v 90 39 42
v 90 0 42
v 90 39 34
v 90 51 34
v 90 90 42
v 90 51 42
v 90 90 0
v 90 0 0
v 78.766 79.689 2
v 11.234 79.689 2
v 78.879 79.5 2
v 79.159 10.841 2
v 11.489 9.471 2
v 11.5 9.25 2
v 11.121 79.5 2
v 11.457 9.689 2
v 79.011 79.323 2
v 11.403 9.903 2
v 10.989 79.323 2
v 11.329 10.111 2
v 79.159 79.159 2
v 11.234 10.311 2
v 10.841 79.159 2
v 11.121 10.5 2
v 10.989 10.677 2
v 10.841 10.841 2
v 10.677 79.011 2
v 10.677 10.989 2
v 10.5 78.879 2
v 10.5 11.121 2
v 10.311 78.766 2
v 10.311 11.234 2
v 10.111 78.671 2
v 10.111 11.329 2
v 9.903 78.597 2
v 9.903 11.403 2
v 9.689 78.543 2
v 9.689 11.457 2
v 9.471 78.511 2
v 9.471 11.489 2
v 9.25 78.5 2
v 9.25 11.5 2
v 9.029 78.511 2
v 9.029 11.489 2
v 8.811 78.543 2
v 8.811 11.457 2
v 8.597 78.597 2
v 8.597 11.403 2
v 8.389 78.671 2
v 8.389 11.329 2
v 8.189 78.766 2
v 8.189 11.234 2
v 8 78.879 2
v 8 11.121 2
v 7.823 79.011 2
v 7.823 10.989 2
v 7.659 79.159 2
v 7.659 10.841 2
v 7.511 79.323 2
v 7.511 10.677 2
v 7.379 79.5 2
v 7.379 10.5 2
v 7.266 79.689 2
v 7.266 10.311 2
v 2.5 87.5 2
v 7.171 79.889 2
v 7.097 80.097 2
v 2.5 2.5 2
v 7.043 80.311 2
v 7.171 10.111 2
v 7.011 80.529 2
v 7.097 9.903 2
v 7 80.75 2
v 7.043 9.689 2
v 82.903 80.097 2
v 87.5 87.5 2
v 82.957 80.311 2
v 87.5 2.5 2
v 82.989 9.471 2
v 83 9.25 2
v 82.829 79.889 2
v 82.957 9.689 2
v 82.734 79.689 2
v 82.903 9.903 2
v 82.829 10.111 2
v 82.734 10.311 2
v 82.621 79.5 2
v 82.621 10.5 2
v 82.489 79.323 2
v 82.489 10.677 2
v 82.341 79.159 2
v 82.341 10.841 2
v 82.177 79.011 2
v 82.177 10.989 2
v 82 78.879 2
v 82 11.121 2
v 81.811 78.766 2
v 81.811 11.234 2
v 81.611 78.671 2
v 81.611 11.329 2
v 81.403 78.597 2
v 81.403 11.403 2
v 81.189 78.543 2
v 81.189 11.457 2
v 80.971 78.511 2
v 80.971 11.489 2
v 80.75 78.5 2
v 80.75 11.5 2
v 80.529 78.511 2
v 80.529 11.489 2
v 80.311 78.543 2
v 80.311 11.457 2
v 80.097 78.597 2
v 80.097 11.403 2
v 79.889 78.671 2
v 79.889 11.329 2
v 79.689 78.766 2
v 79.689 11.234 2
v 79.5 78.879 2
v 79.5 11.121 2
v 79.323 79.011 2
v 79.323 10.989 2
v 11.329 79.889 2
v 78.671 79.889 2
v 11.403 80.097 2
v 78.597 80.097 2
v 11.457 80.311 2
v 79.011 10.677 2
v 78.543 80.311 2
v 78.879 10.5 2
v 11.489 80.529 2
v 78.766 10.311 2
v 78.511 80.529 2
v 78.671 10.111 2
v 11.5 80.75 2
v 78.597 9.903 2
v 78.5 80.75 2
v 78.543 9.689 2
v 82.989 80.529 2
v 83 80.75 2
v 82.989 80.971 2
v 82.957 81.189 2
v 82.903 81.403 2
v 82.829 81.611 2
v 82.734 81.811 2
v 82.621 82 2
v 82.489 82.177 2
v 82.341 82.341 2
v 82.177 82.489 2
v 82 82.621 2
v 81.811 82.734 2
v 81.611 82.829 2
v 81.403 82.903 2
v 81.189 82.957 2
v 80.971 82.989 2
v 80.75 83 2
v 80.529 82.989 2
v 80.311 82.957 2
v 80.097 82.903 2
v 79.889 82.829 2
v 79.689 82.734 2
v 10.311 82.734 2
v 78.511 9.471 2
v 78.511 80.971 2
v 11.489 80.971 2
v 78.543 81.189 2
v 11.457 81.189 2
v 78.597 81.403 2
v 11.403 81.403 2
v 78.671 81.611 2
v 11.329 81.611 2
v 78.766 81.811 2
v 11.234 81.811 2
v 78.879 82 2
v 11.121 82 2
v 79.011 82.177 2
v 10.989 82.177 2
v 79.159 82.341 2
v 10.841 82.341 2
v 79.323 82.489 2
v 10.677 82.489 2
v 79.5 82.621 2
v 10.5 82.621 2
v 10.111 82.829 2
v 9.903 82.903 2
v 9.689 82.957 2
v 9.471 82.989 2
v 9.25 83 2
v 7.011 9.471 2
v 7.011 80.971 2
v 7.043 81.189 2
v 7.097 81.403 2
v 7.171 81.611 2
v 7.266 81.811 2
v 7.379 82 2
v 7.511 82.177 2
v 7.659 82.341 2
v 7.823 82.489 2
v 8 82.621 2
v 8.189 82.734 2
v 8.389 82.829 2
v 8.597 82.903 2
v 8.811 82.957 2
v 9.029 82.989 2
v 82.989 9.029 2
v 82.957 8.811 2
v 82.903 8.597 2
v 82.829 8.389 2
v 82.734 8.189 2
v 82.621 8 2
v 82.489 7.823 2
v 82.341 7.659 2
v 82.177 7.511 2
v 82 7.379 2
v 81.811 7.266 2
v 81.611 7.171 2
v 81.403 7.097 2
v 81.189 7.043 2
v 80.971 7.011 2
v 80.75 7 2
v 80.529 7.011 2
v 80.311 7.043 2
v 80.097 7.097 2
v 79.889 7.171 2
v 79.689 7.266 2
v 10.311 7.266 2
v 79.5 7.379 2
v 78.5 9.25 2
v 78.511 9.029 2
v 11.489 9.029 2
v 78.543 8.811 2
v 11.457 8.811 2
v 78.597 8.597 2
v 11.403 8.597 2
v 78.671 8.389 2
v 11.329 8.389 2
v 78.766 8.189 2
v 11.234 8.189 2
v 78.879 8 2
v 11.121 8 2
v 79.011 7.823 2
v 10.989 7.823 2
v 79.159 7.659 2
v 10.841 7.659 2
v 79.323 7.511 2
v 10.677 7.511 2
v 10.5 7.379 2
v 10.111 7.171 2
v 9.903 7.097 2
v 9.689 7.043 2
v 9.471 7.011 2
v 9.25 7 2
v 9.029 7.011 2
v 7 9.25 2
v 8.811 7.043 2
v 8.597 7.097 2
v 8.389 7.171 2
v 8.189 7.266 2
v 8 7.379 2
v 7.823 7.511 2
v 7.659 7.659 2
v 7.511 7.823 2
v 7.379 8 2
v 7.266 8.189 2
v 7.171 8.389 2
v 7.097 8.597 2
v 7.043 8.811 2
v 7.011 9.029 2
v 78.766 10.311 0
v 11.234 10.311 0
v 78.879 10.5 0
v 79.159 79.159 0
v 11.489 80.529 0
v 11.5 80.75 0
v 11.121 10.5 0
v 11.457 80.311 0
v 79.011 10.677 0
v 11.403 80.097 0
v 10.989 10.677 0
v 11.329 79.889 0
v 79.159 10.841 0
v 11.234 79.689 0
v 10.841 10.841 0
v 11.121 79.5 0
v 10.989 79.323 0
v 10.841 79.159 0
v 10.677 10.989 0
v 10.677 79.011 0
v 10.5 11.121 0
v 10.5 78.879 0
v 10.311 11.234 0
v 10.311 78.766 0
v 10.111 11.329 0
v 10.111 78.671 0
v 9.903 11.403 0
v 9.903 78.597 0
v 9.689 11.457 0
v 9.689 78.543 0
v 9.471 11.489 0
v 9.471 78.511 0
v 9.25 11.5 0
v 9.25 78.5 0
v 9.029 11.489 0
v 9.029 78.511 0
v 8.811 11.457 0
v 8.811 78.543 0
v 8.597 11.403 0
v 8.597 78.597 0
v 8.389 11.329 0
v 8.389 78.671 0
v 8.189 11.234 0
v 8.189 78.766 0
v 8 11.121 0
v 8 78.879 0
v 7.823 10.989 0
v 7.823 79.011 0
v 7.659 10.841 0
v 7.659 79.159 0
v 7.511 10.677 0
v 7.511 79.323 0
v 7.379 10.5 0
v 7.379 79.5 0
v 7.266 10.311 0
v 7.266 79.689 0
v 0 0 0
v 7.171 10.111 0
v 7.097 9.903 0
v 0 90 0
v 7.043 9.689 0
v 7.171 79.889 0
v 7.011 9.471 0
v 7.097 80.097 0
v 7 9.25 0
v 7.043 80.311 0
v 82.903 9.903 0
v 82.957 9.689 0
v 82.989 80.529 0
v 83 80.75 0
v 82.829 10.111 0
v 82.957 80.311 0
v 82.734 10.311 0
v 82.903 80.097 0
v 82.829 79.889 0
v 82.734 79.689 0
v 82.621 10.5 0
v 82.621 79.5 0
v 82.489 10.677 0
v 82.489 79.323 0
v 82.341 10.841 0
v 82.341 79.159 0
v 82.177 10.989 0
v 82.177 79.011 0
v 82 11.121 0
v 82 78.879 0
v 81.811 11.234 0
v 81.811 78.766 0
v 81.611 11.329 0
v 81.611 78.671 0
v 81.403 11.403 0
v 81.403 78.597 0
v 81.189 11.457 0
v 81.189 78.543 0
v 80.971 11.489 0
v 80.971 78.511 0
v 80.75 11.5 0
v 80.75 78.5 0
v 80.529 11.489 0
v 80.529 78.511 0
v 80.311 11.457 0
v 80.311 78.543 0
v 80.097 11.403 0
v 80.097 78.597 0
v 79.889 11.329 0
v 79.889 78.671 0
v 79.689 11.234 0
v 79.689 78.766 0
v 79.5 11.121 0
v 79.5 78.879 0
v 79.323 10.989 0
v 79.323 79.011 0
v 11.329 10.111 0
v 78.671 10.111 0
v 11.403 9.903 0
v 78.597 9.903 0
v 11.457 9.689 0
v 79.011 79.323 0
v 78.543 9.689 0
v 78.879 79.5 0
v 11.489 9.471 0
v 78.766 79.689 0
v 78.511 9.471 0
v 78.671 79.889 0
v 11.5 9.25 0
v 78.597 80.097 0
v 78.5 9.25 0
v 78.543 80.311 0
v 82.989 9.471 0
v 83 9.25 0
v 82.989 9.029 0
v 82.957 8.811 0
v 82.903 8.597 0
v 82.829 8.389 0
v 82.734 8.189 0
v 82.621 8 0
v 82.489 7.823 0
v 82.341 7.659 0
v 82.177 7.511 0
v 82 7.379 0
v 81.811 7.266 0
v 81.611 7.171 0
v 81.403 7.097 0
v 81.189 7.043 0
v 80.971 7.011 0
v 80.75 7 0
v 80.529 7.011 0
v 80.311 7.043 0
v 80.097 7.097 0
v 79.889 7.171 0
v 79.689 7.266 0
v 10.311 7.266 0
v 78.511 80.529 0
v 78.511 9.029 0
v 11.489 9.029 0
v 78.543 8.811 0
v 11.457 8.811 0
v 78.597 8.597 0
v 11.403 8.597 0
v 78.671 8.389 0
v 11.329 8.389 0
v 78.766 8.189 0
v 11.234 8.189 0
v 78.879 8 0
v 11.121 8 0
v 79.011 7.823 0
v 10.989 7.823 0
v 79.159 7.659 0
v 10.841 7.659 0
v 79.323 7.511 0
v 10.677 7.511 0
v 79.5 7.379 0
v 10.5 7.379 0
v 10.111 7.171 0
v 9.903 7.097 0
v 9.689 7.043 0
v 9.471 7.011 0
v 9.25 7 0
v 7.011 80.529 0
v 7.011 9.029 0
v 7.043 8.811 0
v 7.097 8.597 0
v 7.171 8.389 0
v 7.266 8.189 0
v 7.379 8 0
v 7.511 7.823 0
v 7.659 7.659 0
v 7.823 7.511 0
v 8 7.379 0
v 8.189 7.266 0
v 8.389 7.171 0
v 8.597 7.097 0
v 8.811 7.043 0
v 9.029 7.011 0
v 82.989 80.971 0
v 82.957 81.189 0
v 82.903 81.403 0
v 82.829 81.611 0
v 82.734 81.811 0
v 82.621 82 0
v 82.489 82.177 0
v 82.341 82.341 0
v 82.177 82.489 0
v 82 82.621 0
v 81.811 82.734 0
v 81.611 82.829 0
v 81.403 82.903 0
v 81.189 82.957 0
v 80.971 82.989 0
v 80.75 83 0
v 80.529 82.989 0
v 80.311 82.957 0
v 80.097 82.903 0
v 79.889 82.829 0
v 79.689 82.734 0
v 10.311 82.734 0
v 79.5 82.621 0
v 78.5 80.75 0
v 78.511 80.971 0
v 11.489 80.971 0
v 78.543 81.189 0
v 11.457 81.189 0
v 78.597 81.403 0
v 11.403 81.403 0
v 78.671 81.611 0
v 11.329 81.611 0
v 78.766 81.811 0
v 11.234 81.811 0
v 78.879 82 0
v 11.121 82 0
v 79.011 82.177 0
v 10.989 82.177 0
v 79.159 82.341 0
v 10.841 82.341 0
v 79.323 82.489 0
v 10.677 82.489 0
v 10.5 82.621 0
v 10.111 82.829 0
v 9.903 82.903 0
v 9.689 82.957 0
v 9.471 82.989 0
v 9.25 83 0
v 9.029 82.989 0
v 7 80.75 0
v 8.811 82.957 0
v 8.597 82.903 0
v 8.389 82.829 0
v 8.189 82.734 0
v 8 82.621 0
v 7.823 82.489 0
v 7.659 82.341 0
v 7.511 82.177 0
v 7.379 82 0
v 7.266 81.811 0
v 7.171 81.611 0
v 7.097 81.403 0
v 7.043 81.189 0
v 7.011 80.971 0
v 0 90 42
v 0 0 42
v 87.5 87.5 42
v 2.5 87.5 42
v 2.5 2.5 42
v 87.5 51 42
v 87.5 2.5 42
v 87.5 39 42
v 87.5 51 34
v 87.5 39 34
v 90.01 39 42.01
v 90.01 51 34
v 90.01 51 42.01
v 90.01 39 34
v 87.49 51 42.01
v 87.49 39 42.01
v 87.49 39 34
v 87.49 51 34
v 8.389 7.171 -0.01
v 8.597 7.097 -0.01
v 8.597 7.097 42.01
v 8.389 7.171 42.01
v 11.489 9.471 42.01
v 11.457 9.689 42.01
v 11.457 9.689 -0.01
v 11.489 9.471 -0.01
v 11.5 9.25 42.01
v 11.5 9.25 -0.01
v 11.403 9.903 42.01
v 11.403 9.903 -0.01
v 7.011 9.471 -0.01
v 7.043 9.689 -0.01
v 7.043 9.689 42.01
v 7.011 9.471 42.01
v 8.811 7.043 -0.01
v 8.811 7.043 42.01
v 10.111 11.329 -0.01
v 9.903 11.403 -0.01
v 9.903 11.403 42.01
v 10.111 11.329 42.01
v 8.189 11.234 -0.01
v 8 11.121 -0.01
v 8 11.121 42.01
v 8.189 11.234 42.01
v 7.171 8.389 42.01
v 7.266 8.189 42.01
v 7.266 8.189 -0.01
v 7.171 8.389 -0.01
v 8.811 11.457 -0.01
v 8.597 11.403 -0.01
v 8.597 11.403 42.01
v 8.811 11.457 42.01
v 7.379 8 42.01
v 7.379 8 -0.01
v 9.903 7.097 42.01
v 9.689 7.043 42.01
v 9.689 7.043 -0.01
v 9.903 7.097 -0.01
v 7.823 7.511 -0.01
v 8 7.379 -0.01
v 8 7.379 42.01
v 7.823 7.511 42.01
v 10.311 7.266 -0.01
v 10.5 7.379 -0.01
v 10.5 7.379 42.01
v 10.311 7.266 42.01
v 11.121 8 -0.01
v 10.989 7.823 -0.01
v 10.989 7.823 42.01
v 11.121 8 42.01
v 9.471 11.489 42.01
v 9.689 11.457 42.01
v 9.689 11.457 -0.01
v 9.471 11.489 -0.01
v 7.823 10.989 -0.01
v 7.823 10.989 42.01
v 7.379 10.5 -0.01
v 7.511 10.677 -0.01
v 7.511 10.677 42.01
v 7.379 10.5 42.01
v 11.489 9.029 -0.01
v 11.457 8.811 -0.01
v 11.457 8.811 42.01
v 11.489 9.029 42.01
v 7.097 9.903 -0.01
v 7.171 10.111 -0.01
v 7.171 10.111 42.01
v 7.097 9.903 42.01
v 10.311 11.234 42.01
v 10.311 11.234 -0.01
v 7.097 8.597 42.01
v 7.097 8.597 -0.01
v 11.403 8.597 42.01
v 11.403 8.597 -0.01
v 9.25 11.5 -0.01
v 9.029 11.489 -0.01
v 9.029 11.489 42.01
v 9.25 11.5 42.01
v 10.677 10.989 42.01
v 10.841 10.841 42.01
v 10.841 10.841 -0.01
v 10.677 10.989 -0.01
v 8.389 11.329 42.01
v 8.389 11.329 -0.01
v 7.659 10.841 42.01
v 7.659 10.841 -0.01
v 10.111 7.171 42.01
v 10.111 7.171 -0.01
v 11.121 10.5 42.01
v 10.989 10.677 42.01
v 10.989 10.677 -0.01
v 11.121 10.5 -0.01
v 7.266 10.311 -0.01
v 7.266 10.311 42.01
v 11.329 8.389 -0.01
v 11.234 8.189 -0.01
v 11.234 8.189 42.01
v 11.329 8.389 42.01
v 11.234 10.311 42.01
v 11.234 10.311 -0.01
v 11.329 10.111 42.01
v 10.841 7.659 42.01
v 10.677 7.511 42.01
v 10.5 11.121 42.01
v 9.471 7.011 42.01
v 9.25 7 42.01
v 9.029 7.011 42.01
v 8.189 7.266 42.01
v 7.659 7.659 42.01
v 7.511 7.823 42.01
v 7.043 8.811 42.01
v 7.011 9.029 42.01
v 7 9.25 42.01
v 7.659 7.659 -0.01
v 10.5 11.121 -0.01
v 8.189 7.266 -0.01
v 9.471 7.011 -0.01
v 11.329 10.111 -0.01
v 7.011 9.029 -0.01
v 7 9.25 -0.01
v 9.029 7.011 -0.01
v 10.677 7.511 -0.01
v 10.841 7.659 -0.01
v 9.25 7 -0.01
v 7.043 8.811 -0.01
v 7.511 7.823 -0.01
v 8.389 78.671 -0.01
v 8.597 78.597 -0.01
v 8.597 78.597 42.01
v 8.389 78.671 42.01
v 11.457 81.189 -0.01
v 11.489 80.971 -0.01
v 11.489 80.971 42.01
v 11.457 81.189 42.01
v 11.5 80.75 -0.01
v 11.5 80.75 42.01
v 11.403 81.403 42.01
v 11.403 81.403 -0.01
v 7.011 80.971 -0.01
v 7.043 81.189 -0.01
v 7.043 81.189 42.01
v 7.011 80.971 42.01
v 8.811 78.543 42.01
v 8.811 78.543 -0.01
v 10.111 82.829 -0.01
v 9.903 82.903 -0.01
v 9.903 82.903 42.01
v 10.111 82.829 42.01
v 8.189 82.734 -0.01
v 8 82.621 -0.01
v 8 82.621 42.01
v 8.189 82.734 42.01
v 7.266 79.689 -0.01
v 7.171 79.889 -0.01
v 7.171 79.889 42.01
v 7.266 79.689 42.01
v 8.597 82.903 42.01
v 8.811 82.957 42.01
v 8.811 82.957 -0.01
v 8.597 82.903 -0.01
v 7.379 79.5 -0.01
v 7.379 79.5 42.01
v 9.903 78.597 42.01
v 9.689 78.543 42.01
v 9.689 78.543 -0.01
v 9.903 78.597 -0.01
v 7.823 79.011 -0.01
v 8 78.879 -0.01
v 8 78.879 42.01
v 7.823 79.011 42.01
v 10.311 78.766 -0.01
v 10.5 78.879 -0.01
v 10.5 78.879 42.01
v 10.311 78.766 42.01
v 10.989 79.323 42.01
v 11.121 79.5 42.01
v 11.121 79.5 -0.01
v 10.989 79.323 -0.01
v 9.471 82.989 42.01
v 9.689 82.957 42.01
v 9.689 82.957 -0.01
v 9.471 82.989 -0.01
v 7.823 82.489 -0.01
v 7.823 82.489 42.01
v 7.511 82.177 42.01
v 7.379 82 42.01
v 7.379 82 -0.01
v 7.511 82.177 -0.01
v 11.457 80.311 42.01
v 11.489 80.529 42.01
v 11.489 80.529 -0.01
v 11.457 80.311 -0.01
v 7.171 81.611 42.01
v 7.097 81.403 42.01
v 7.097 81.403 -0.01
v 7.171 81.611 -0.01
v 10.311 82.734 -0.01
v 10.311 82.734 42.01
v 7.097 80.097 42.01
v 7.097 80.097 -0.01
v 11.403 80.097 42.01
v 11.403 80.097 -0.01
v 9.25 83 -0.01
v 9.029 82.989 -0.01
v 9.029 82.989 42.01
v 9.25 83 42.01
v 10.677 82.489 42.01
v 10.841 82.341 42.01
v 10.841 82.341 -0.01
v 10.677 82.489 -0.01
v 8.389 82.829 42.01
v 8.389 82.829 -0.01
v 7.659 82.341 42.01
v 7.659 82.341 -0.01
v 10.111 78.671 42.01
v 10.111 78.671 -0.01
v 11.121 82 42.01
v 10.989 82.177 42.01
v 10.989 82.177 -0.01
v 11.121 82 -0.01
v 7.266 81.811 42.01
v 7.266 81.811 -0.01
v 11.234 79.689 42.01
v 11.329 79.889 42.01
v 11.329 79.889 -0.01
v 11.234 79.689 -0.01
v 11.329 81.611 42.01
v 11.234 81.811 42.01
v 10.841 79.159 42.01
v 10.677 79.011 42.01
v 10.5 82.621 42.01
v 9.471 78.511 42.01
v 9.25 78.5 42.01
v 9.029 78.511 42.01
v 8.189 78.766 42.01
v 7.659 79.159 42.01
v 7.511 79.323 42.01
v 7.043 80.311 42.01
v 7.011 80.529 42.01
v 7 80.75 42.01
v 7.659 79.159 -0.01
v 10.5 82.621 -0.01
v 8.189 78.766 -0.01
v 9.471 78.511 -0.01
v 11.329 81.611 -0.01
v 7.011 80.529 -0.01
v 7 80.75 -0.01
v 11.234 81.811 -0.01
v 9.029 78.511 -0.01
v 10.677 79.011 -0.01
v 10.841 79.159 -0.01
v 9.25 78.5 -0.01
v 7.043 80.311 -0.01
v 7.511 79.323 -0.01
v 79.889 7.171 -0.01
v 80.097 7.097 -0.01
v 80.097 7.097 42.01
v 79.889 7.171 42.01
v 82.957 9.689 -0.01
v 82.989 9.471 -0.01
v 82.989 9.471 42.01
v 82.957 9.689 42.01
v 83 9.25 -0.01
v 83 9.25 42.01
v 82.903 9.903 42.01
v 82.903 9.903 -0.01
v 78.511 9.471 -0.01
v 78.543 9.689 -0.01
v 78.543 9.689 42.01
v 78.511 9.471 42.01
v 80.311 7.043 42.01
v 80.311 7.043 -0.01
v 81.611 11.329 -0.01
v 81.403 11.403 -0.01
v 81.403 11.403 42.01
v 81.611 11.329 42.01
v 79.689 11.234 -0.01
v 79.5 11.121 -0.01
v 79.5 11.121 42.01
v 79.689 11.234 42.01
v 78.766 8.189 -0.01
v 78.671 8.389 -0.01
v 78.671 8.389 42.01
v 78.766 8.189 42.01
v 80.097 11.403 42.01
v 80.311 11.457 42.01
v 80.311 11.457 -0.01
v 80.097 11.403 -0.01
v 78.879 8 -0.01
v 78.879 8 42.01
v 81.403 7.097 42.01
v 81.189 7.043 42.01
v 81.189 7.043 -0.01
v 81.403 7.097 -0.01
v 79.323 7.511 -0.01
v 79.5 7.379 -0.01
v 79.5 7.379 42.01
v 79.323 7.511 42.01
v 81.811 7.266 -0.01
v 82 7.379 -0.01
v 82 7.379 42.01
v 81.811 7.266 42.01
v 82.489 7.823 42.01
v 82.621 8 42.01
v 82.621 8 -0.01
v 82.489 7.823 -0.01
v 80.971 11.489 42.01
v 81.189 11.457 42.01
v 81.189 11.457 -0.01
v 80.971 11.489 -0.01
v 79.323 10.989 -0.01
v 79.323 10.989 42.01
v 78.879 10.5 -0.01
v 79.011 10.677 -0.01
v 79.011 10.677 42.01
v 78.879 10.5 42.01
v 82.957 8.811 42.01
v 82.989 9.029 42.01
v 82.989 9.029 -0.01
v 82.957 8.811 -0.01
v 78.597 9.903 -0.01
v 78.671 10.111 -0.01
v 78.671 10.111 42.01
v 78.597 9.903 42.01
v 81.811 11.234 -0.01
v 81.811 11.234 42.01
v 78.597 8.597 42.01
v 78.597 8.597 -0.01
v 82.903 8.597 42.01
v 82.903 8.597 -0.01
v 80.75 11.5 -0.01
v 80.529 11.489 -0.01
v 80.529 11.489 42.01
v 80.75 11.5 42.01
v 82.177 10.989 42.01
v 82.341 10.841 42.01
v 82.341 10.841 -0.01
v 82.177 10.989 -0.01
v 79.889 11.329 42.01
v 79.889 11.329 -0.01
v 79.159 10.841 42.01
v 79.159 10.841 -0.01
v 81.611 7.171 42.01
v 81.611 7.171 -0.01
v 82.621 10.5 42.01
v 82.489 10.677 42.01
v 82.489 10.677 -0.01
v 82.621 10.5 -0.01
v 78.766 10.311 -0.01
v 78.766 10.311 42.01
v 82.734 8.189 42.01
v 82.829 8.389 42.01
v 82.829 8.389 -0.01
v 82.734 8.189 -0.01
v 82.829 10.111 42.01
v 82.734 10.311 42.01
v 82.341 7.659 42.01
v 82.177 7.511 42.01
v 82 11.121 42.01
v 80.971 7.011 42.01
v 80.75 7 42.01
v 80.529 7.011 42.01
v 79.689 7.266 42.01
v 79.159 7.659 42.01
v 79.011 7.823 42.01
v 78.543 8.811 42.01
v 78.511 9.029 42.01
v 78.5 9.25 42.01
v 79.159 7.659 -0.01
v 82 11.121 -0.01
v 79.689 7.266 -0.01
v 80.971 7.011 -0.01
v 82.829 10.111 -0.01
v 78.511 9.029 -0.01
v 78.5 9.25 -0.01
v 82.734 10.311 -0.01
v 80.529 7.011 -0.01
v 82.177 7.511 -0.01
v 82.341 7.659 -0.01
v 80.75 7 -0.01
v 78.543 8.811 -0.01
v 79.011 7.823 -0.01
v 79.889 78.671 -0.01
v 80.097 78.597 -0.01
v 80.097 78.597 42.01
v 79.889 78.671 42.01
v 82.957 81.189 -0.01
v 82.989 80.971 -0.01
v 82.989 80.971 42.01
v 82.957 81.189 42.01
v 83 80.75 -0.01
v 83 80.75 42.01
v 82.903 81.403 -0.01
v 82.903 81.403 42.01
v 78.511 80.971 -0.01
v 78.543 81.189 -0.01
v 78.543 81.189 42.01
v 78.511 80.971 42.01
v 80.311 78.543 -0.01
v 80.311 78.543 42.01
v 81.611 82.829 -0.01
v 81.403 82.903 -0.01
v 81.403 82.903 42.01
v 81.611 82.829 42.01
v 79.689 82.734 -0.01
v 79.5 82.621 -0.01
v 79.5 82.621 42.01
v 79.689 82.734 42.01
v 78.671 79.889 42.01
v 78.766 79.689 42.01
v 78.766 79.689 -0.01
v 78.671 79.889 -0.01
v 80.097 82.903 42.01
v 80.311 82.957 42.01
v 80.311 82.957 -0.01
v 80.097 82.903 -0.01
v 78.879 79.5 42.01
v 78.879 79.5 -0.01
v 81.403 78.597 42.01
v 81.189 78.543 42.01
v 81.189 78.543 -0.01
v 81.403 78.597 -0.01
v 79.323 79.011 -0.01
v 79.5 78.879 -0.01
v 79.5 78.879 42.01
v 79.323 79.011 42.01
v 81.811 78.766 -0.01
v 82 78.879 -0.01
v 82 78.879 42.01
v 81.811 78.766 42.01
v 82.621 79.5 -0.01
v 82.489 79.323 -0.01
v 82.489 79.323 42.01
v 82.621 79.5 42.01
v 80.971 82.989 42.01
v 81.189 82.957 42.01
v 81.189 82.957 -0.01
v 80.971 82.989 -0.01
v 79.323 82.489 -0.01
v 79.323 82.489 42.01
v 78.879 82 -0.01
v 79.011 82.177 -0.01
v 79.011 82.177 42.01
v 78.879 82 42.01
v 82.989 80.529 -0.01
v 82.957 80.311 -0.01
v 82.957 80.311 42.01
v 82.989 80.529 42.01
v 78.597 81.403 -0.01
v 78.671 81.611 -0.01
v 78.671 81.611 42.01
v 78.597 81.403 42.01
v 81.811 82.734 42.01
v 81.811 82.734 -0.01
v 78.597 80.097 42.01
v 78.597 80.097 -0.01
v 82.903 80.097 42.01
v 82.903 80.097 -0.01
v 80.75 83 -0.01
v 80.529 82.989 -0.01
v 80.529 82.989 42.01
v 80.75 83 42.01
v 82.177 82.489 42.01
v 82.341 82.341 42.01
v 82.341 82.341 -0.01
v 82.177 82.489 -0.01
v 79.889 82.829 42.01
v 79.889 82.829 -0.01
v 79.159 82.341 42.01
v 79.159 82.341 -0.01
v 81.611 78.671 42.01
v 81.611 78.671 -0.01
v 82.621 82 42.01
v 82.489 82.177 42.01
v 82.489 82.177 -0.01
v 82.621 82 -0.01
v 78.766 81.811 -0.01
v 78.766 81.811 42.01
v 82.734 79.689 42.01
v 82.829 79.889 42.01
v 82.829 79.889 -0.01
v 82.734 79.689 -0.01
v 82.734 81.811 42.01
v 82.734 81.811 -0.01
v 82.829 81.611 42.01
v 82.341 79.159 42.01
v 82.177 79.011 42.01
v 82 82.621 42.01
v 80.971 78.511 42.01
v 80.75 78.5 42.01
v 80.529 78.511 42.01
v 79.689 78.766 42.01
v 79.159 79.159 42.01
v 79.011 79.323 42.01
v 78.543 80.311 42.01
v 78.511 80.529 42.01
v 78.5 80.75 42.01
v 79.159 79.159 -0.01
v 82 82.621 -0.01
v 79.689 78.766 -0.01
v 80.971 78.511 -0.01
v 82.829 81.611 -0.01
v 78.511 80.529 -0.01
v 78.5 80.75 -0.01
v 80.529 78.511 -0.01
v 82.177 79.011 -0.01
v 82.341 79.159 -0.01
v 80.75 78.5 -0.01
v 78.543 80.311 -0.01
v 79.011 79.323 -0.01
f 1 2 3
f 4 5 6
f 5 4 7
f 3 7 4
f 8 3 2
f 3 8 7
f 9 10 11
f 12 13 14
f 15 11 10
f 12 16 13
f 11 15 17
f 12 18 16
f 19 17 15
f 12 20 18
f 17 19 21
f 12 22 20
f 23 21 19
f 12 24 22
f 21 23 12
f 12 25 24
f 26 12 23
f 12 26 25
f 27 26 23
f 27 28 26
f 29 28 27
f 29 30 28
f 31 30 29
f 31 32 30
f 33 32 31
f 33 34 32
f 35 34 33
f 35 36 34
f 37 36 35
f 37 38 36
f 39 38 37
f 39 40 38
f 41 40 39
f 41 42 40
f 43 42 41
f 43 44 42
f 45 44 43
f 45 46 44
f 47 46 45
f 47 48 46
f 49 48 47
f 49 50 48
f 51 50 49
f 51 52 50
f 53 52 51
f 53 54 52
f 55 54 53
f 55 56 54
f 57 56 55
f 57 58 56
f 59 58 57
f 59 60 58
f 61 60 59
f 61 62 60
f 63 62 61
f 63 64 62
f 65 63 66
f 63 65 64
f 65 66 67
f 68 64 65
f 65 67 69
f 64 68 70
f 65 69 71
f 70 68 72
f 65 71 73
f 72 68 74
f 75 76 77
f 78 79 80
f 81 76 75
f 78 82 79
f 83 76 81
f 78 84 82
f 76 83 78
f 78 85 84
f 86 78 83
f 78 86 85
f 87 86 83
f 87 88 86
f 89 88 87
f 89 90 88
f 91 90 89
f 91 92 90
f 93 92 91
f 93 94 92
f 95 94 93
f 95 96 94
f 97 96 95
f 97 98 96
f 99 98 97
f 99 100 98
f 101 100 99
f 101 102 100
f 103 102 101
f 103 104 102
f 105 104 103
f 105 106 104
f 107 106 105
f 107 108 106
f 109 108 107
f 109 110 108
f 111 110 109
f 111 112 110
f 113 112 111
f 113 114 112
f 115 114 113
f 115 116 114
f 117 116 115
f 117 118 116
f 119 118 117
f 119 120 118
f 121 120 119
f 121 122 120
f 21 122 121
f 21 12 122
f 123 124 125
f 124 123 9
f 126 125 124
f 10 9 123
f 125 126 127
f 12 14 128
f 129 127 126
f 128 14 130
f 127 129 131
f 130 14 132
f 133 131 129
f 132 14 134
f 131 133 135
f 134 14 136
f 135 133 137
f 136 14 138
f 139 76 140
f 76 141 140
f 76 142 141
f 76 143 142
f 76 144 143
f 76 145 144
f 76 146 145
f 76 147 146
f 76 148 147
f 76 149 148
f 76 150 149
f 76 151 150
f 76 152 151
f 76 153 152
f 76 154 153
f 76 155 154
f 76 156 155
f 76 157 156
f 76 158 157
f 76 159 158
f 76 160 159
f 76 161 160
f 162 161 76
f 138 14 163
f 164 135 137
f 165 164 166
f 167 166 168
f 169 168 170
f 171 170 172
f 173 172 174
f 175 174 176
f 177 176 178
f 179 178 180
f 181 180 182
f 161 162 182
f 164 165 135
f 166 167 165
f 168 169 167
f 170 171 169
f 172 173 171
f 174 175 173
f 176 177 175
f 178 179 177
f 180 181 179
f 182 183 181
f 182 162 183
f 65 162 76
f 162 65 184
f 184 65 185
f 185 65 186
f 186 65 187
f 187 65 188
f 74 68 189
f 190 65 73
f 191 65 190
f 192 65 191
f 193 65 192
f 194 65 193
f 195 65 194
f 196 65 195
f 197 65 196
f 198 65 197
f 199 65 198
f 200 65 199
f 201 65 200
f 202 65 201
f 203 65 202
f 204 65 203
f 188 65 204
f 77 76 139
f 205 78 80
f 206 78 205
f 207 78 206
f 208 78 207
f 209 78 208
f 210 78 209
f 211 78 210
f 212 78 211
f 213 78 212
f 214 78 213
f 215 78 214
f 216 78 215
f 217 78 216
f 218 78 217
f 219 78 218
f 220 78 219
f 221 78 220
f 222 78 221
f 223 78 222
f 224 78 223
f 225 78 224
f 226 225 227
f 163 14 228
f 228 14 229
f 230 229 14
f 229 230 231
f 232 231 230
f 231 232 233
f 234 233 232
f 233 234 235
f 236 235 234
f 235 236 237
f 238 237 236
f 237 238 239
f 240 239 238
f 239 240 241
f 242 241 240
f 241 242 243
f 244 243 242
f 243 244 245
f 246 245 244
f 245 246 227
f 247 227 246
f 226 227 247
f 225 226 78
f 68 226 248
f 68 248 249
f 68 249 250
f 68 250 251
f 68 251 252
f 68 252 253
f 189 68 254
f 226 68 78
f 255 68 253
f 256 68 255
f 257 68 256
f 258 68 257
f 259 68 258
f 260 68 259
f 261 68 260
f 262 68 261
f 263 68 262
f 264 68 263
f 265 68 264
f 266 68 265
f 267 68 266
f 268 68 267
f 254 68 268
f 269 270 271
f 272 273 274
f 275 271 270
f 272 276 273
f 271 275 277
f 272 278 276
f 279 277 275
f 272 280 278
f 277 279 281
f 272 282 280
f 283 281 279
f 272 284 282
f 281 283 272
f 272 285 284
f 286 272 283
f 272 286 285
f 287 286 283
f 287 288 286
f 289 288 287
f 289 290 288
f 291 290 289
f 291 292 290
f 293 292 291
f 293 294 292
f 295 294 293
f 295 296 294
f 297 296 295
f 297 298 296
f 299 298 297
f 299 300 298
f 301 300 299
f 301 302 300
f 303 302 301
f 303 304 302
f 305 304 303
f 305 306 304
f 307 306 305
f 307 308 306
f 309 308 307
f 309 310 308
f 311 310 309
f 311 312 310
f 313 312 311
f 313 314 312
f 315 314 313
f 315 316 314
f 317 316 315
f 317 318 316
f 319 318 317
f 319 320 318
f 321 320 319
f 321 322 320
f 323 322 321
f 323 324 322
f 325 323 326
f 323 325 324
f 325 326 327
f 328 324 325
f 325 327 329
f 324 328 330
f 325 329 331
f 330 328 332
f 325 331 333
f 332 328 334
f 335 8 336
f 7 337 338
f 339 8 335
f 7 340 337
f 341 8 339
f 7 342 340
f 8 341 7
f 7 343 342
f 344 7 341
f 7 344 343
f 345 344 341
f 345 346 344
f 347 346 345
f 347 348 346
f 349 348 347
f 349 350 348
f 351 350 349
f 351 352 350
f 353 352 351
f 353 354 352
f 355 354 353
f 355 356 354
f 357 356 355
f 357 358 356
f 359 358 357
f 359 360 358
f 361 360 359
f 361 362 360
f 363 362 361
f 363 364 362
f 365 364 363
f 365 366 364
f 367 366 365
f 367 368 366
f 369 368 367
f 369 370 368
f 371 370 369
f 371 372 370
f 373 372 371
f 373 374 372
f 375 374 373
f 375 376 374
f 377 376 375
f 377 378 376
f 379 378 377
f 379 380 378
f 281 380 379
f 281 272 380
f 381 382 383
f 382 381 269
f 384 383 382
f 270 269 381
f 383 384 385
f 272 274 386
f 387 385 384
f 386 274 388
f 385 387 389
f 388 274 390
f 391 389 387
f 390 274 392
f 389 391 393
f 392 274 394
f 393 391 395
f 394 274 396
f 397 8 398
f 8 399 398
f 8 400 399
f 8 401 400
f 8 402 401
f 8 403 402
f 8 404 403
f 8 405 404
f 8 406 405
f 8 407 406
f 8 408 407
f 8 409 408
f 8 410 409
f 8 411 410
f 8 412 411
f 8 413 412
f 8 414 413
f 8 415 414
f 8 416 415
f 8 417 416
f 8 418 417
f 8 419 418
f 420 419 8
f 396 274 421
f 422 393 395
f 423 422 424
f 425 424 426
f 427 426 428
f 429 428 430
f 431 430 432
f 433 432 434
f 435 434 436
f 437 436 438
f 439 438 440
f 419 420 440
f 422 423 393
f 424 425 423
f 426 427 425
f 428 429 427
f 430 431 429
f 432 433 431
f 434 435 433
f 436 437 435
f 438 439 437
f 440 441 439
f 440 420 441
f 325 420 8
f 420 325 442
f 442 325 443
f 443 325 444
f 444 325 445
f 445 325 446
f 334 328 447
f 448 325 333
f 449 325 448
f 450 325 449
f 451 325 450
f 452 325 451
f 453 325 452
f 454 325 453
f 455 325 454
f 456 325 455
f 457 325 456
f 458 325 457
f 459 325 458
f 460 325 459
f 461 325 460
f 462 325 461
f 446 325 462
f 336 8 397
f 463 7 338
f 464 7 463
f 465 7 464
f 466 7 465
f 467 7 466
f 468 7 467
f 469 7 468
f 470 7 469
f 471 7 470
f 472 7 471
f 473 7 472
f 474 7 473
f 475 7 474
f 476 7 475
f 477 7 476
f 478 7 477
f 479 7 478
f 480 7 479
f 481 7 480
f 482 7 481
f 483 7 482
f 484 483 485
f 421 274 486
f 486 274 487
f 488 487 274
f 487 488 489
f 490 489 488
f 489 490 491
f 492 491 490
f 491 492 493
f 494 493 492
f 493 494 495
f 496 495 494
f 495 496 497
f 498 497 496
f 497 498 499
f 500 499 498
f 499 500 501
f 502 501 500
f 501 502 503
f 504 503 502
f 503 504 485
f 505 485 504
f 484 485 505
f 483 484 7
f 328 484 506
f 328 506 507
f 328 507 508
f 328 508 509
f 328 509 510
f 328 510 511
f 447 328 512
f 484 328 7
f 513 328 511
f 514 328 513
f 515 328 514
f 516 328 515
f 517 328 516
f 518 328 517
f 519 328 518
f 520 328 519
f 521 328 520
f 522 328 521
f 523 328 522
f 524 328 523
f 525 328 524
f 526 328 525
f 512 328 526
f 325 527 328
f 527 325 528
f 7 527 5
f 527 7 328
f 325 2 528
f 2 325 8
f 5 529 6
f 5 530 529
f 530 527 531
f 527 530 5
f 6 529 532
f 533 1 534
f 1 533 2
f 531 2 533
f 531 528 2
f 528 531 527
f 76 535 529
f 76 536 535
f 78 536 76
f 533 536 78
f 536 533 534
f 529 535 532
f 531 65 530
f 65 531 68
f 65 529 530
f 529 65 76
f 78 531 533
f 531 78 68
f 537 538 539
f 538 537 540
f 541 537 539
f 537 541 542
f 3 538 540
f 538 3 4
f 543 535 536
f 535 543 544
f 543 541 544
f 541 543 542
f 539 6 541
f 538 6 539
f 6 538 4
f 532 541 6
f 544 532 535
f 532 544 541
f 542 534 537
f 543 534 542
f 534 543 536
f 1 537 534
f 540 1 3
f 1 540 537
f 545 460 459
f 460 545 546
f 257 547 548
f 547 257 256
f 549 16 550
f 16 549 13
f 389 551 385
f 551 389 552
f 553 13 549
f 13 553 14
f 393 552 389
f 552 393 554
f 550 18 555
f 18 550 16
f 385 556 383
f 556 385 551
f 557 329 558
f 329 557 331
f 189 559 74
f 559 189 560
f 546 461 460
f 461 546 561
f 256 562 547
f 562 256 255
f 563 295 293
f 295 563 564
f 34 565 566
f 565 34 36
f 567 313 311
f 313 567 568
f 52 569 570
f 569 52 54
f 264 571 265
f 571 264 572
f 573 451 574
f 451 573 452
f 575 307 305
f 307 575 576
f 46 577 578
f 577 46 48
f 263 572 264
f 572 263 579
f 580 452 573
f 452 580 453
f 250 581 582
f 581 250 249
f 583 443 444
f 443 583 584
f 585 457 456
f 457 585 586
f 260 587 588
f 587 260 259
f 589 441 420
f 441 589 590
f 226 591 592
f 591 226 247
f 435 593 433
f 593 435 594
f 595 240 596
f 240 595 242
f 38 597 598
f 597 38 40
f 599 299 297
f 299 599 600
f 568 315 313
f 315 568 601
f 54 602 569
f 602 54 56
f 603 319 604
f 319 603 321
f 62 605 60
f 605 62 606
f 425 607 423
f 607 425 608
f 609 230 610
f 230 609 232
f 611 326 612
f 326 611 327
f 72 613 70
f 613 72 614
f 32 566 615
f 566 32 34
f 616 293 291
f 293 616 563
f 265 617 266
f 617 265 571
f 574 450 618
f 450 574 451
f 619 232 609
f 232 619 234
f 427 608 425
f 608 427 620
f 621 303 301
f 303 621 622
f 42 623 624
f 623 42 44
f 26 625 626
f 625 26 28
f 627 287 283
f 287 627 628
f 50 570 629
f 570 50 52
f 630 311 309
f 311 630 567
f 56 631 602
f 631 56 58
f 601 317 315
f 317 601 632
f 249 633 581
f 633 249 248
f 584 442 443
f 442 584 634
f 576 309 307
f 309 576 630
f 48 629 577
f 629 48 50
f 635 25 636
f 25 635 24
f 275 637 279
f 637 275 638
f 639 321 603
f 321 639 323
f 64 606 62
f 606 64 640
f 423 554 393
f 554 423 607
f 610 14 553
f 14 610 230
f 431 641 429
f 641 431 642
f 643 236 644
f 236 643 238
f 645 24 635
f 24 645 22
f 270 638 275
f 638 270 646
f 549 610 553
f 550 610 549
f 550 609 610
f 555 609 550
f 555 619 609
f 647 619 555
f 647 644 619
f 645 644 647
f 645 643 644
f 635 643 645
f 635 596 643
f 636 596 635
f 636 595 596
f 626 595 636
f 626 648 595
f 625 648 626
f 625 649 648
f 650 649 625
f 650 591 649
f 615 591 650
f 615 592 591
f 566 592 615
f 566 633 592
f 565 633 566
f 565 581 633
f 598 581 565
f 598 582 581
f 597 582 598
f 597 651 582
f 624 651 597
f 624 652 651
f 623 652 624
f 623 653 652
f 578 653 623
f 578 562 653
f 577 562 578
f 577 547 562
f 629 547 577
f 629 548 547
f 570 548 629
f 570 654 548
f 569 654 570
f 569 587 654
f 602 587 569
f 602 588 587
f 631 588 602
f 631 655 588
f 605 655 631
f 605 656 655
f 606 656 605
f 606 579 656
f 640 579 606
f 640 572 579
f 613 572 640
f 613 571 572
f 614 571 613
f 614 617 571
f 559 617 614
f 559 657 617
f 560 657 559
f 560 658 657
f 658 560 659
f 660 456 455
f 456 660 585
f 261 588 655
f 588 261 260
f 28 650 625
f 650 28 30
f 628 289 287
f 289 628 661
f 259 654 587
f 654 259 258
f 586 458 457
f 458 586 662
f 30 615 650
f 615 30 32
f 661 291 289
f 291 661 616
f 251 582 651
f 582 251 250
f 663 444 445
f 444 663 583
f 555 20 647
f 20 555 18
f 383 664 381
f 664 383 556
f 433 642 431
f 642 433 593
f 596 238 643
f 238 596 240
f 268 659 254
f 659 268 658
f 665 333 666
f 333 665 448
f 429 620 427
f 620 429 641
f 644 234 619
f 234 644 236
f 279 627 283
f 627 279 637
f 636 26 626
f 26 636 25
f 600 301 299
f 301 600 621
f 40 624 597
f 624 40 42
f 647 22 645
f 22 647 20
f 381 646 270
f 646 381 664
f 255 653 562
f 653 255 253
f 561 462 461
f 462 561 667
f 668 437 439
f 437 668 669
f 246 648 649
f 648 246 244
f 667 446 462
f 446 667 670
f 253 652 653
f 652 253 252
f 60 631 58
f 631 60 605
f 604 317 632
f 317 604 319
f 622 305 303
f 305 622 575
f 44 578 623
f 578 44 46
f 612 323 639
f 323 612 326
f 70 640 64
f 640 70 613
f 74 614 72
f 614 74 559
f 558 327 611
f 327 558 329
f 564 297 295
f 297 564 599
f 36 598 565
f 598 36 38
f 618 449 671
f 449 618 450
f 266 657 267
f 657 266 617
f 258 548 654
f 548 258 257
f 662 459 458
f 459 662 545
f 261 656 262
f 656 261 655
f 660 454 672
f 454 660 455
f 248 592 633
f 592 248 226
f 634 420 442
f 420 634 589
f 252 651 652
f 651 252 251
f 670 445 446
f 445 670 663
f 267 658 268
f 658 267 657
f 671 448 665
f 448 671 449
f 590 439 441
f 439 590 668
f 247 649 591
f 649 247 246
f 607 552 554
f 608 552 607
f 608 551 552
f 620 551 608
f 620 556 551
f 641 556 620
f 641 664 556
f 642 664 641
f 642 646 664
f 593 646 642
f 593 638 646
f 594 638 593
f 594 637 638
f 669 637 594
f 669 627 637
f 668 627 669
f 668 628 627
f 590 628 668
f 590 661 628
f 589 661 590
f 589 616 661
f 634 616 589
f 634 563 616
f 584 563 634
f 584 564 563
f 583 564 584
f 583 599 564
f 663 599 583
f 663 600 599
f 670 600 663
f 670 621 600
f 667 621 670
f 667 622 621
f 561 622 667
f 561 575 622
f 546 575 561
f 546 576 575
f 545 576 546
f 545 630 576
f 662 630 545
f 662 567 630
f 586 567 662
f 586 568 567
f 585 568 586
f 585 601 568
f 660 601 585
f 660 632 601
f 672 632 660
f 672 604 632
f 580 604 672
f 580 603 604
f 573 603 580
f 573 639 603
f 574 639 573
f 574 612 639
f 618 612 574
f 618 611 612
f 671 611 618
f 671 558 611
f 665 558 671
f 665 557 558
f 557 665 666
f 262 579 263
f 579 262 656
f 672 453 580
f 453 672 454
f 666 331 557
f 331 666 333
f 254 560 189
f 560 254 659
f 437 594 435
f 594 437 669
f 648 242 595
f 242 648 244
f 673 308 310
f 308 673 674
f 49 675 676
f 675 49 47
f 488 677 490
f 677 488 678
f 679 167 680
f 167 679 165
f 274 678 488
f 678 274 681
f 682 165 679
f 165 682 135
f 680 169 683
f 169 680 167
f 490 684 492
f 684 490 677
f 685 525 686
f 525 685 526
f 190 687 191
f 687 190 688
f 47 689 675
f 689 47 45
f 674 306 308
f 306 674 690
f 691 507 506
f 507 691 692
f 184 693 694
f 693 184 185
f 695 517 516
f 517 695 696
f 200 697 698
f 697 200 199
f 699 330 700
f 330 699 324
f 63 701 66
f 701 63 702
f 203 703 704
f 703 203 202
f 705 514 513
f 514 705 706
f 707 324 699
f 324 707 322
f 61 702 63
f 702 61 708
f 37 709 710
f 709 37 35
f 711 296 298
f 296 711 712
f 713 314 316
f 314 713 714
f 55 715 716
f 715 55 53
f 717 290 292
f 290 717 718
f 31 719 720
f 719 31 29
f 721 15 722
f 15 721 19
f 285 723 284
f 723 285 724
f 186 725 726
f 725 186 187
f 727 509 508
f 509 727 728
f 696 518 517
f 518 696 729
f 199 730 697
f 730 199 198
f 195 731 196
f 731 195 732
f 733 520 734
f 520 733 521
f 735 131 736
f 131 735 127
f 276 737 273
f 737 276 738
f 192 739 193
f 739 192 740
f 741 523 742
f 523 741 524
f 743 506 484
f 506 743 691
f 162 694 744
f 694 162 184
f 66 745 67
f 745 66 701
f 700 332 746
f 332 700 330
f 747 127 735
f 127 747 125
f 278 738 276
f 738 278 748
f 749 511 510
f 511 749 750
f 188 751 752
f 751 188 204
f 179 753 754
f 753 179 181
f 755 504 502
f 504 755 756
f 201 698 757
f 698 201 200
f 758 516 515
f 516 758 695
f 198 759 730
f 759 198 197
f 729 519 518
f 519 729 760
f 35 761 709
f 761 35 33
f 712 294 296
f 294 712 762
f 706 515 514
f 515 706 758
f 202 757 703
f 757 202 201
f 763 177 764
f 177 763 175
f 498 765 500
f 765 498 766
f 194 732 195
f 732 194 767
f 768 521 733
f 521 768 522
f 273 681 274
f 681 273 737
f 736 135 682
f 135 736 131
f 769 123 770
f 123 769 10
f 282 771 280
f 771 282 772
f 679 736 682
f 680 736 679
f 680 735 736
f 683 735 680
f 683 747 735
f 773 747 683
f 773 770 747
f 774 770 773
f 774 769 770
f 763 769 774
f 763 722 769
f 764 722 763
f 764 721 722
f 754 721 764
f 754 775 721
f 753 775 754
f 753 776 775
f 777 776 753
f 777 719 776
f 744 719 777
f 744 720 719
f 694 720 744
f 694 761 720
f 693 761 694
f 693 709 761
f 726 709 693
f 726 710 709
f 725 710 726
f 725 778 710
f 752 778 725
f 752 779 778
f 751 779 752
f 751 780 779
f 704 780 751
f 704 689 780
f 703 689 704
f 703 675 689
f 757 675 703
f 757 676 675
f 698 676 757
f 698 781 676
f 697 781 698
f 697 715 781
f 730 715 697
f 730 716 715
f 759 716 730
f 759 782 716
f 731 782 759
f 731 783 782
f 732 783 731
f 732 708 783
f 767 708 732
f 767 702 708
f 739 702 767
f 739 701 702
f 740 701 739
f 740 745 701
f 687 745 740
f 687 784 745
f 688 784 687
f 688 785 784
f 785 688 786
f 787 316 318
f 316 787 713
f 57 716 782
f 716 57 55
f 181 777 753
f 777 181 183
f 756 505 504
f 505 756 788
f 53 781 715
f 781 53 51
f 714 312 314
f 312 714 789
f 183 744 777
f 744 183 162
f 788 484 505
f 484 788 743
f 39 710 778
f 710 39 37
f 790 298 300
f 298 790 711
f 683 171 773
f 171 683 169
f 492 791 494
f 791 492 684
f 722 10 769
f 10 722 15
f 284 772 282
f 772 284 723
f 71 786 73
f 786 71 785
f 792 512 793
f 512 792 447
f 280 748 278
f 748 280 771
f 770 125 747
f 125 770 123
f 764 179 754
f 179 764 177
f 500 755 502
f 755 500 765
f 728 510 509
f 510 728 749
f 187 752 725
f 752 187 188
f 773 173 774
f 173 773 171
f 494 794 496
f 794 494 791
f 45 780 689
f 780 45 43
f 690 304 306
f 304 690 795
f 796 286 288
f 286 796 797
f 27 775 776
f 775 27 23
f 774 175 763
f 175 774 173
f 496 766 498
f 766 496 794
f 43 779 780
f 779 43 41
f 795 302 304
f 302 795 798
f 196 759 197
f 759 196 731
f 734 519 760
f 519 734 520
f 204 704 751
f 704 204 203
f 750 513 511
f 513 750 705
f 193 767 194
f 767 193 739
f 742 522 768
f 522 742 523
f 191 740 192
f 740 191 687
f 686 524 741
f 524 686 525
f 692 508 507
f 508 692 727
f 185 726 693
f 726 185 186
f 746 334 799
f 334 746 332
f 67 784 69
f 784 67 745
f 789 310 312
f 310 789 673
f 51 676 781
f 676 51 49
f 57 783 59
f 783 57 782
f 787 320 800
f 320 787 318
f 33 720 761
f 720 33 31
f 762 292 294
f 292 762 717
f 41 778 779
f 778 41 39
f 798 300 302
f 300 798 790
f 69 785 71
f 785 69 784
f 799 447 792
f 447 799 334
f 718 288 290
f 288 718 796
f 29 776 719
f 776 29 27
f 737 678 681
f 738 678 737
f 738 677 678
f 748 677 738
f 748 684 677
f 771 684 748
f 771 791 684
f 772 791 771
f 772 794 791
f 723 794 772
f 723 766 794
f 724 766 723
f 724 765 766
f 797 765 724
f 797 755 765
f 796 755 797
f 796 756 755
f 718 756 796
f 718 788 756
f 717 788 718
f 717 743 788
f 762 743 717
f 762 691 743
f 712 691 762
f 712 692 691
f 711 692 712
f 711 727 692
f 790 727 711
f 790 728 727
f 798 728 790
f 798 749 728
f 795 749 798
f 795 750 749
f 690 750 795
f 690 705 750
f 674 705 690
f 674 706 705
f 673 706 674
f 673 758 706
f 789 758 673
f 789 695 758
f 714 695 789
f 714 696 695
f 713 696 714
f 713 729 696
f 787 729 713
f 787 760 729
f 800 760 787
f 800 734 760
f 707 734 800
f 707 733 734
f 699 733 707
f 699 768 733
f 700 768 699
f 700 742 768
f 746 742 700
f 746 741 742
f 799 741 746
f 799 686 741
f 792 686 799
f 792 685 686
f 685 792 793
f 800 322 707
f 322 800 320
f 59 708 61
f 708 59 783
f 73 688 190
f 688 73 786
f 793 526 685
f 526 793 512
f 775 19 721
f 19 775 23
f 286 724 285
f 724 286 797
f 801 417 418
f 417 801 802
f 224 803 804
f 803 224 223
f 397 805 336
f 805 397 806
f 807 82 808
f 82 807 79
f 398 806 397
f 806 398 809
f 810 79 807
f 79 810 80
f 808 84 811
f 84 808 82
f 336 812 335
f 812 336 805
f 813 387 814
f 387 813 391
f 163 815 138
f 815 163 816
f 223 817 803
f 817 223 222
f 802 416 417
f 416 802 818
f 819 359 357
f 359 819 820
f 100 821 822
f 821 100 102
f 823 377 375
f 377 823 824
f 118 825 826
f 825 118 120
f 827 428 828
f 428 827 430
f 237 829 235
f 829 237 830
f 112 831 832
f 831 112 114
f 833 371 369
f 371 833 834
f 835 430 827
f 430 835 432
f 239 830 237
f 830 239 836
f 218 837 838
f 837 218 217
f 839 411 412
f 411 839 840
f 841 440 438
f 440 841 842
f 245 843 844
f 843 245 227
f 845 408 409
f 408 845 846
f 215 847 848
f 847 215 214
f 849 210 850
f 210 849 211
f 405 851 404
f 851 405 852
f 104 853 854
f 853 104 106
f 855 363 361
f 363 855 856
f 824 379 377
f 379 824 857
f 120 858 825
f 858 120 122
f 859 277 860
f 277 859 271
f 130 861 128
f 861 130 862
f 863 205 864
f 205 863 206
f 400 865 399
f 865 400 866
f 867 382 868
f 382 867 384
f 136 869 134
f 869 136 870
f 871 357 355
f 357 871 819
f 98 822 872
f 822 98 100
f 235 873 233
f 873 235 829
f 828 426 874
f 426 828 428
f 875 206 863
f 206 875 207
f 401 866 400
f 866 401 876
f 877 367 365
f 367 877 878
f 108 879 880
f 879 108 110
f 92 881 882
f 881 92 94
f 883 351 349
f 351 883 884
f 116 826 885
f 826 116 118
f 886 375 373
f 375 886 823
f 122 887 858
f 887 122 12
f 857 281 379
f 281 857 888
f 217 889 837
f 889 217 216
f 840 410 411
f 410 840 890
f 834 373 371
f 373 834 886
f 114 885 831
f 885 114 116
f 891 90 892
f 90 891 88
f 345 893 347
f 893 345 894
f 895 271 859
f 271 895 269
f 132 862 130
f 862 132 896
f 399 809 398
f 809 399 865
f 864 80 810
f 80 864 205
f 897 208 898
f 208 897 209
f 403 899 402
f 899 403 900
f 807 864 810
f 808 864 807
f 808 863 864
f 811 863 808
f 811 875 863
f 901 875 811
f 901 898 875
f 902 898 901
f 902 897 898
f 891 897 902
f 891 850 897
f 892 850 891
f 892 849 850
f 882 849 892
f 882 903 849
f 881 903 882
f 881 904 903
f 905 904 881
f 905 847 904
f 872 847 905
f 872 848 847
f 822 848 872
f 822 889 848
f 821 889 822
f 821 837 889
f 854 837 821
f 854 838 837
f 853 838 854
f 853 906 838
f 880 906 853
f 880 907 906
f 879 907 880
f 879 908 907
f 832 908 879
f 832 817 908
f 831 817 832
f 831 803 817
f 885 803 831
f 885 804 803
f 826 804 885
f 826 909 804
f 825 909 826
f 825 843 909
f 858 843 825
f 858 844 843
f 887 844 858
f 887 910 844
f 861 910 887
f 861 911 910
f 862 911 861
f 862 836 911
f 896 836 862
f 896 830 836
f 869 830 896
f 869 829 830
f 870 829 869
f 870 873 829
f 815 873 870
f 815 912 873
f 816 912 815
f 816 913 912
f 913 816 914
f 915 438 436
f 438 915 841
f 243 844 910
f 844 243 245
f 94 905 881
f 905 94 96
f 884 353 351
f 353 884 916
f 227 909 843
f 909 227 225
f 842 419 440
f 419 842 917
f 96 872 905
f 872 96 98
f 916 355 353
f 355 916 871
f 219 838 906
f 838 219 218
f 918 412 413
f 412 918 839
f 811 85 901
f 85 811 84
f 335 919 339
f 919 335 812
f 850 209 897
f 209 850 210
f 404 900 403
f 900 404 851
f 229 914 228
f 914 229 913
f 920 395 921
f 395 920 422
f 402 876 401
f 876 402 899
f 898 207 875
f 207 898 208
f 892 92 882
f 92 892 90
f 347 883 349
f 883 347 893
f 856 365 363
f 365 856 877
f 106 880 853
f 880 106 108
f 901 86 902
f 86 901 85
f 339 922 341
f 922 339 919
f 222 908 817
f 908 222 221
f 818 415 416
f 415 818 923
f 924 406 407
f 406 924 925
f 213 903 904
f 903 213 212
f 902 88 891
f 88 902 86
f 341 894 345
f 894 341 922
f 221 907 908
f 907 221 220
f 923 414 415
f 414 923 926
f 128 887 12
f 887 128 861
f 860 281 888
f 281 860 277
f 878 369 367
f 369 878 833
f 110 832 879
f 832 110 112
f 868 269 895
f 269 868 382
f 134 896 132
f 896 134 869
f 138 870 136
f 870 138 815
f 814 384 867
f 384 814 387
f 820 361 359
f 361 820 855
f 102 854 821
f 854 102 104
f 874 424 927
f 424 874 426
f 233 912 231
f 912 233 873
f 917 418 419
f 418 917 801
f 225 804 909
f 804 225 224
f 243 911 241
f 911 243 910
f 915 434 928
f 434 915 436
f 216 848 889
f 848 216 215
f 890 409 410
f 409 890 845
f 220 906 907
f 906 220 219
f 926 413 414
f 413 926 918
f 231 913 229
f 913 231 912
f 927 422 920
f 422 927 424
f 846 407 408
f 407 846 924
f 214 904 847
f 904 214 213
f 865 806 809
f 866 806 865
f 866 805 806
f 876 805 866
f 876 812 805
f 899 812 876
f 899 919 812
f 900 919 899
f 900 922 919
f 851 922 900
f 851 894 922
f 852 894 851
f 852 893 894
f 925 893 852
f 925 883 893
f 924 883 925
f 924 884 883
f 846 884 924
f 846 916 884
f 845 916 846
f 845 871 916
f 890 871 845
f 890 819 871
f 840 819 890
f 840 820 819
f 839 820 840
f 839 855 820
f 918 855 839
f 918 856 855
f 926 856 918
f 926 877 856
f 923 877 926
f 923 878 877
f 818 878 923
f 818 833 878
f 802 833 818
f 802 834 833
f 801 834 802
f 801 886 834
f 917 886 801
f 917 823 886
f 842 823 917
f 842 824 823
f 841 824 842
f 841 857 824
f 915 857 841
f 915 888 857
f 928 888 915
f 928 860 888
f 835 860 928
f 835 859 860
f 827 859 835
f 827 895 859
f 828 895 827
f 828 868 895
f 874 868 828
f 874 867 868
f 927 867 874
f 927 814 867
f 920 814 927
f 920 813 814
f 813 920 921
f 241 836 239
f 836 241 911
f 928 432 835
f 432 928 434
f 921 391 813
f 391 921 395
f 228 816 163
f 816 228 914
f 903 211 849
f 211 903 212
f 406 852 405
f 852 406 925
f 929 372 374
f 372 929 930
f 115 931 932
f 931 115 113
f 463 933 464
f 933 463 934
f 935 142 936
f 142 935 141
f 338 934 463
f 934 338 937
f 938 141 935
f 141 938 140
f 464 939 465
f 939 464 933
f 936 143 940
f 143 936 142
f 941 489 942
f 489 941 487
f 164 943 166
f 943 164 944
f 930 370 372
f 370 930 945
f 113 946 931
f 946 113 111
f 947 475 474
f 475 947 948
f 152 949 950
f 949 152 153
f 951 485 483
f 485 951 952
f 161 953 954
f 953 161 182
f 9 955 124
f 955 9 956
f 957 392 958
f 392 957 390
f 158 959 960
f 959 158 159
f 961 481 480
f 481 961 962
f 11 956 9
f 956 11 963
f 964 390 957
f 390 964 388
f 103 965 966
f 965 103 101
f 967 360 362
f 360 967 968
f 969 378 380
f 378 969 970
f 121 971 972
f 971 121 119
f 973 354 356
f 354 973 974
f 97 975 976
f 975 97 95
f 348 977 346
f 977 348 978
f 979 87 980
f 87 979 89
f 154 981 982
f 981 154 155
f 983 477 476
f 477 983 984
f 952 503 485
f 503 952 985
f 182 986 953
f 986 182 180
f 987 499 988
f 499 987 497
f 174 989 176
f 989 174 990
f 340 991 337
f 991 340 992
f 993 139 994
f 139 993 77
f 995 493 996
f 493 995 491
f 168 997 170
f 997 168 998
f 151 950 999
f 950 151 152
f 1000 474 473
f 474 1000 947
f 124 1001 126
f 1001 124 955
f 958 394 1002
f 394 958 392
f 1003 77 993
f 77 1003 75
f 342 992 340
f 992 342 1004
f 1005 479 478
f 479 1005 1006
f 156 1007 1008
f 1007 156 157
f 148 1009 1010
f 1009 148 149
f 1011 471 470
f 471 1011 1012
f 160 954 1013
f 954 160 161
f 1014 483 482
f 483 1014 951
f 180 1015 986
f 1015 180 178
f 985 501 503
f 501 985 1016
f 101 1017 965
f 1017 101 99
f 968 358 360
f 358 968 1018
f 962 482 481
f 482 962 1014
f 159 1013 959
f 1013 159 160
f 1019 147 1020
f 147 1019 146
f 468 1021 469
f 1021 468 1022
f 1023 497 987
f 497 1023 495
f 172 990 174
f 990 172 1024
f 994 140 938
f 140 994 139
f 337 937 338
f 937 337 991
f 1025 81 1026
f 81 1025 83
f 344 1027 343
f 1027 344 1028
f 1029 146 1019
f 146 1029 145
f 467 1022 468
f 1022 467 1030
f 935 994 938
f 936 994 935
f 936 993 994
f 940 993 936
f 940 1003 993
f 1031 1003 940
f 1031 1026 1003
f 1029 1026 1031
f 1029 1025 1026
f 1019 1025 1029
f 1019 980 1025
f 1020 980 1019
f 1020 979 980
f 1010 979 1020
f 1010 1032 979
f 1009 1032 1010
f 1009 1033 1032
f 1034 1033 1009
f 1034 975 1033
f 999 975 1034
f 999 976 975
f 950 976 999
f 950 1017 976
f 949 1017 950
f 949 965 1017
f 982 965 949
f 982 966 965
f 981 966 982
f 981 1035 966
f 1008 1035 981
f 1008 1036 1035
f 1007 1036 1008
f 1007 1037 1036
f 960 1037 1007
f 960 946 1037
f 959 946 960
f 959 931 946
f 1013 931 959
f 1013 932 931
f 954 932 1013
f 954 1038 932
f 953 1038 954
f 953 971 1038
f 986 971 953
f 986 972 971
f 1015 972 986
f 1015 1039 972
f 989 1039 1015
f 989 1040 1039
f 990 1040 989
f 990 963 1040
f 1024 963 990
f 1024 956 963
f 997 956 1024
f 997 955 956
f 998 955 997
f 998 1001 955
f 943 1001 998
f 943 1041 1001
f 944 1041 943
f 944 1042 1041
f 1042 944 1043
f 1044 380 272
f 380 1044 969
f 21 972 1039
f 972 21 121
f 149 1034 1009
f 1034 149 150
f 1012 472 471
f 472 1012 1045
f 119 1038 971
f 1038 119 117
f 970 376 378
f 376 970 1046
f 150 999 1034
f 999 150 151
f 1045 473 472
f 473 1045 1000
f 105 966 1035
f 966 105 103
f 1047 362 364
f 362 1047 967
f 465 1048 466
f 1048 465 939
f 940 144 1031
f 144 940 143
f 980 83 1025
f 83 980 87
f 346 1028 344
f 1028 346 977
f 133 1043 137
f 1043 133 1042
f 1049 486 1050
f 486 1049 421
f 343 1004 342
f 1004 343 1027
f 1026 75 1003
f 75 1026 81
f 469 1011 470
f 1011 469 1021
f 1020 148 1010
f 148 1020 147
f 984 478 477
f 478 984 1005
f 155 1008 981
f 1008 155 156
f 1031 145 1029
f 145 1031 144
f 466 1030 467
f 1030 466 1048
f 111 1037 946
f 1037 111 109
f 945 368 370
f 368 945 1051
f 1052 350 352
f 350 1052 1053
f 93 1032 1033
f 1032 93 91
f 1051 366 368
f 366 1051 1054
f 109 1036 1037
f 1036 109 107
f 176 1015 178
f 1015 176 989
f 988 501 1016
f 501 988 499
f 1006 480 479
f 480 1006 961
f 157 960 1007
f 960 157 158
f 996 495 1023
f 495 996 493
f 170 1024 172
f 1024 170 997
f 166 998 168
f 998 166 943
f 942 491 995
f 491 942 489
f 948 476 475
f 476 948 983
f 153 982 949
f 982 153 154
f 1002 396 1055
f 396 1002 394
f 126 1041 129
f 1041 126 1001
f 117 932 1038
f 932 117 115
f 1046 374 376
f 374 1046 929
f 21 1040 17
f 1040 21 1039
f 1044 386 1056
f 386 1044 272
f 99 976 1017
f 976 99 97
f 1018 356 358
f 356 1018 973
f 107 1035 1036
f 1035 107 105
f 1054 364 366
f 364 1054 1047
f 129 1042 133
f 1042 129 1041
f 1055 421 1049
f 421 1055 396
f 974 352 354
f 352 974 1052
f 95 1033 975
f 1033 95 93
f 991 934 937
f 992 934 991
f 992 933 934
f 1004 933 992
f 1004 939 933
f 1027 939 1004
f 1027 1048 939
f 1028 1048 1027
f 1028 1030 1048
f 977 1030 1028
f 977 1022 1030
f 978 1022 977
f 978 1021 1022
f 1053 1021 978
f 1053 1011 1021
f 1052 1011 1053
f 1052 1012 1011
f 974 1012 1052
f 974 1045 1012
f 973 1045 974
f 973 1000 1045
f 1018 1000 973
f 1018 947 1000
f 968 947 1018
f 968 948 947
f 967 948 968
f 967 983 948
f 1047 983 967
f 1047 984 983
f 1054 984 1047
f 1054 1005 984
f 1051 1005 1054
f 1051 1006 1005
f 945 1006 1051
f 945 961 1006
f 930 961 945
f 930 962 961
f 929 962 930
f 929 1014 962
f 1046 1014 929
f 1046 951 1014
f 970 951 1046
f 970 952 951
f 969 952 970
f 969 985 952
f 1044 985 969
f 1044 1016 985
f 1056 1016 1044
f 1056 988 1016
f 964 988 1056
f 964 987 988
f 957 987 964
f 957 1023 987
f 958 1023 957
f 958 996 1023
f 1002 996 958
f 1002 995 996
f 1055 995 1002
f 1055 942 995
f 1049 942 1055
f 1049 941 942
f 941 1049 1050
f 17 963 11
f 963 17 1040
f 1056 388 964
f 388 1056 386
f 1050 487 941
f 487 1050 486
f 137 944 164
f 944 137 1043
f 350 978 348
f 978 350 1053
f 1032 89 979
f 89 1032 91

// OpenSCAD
// === Dimensions ===
// Top plate thickness
top_plate_thick = 2;
// Wall thickness
wall_thick = 2.5;
// Wall height (from top of plate)
wall_height = 40;
// Outer width (X)
outer_w = 90;
// Outer depth (Y)
outer_d = 90;
// Total height (plate + walls)
total_h = top_plate_thick + wall_height;
// Screw hole diameter
screw_dia = 4.5;
// Screw hole pattern size (square)
screw_pattern = 71.5;
// Cable notch width
notch_w = 12;
// Cable notch depth from top edge
notch_depth = 8;
// Notch position (which wall: 0=X+, 1=Y+, 2=X-, 3=Y-)
notch_wall = 0; // X+ wall

// === Calculated ===
// Inner width
inner_w = outer_w - 2 * wall_thick;
// Inner depth
inner_d = outer_d - 2 * wall_thick;
// Notch start Z (from bottom)
notch_z_start = total_h - notch_depth;

// === Build ===
union() {
    // Top plate (on bed)
    cube([outer_w, outer_d, top_plate_thick], center=false);
    
    // Four walls
    // X+ wall
    translate([outer_w - wall_thick, 0, top_plate_thick])
        cube([wall_thick, outer_d, wall_height]);
    // X- wall
    translate([0, 0, top_plate_thick])
        cube([wall_thick, outer_d, wall_height]);
    // Y+ wall
    translate([0, outer_d - wall_thick, top_plate_thick])
        cube([outer_w, wall_thick, wall_height]);
    // Y- wall
    translate([0, 0, top_plate_thick])
        cube([outer_w, wall_thick, wall_height]);
    
    // Cable notch in X+ wall
    translate([outer_w - wall_thick - 0.01, (outer_d - notch_w)/2, notch_z_start])
        cube([wall_thick + 0.02, notch_w, notch_depth + 0.01]);
}

// Screw holes through top plate
for (i = [-1, 1]) {
    for (j = [-1, 1]) {
        translate([
            (outer_w/2) + (i * screw_pattern/2),
            (outer_d/2) + (j * screw_pattern/2),
            -0.01
        ])
        cylinder(d=screw_dia, h=total_h + 0.02, center=false, $fn=64);
    }
}
